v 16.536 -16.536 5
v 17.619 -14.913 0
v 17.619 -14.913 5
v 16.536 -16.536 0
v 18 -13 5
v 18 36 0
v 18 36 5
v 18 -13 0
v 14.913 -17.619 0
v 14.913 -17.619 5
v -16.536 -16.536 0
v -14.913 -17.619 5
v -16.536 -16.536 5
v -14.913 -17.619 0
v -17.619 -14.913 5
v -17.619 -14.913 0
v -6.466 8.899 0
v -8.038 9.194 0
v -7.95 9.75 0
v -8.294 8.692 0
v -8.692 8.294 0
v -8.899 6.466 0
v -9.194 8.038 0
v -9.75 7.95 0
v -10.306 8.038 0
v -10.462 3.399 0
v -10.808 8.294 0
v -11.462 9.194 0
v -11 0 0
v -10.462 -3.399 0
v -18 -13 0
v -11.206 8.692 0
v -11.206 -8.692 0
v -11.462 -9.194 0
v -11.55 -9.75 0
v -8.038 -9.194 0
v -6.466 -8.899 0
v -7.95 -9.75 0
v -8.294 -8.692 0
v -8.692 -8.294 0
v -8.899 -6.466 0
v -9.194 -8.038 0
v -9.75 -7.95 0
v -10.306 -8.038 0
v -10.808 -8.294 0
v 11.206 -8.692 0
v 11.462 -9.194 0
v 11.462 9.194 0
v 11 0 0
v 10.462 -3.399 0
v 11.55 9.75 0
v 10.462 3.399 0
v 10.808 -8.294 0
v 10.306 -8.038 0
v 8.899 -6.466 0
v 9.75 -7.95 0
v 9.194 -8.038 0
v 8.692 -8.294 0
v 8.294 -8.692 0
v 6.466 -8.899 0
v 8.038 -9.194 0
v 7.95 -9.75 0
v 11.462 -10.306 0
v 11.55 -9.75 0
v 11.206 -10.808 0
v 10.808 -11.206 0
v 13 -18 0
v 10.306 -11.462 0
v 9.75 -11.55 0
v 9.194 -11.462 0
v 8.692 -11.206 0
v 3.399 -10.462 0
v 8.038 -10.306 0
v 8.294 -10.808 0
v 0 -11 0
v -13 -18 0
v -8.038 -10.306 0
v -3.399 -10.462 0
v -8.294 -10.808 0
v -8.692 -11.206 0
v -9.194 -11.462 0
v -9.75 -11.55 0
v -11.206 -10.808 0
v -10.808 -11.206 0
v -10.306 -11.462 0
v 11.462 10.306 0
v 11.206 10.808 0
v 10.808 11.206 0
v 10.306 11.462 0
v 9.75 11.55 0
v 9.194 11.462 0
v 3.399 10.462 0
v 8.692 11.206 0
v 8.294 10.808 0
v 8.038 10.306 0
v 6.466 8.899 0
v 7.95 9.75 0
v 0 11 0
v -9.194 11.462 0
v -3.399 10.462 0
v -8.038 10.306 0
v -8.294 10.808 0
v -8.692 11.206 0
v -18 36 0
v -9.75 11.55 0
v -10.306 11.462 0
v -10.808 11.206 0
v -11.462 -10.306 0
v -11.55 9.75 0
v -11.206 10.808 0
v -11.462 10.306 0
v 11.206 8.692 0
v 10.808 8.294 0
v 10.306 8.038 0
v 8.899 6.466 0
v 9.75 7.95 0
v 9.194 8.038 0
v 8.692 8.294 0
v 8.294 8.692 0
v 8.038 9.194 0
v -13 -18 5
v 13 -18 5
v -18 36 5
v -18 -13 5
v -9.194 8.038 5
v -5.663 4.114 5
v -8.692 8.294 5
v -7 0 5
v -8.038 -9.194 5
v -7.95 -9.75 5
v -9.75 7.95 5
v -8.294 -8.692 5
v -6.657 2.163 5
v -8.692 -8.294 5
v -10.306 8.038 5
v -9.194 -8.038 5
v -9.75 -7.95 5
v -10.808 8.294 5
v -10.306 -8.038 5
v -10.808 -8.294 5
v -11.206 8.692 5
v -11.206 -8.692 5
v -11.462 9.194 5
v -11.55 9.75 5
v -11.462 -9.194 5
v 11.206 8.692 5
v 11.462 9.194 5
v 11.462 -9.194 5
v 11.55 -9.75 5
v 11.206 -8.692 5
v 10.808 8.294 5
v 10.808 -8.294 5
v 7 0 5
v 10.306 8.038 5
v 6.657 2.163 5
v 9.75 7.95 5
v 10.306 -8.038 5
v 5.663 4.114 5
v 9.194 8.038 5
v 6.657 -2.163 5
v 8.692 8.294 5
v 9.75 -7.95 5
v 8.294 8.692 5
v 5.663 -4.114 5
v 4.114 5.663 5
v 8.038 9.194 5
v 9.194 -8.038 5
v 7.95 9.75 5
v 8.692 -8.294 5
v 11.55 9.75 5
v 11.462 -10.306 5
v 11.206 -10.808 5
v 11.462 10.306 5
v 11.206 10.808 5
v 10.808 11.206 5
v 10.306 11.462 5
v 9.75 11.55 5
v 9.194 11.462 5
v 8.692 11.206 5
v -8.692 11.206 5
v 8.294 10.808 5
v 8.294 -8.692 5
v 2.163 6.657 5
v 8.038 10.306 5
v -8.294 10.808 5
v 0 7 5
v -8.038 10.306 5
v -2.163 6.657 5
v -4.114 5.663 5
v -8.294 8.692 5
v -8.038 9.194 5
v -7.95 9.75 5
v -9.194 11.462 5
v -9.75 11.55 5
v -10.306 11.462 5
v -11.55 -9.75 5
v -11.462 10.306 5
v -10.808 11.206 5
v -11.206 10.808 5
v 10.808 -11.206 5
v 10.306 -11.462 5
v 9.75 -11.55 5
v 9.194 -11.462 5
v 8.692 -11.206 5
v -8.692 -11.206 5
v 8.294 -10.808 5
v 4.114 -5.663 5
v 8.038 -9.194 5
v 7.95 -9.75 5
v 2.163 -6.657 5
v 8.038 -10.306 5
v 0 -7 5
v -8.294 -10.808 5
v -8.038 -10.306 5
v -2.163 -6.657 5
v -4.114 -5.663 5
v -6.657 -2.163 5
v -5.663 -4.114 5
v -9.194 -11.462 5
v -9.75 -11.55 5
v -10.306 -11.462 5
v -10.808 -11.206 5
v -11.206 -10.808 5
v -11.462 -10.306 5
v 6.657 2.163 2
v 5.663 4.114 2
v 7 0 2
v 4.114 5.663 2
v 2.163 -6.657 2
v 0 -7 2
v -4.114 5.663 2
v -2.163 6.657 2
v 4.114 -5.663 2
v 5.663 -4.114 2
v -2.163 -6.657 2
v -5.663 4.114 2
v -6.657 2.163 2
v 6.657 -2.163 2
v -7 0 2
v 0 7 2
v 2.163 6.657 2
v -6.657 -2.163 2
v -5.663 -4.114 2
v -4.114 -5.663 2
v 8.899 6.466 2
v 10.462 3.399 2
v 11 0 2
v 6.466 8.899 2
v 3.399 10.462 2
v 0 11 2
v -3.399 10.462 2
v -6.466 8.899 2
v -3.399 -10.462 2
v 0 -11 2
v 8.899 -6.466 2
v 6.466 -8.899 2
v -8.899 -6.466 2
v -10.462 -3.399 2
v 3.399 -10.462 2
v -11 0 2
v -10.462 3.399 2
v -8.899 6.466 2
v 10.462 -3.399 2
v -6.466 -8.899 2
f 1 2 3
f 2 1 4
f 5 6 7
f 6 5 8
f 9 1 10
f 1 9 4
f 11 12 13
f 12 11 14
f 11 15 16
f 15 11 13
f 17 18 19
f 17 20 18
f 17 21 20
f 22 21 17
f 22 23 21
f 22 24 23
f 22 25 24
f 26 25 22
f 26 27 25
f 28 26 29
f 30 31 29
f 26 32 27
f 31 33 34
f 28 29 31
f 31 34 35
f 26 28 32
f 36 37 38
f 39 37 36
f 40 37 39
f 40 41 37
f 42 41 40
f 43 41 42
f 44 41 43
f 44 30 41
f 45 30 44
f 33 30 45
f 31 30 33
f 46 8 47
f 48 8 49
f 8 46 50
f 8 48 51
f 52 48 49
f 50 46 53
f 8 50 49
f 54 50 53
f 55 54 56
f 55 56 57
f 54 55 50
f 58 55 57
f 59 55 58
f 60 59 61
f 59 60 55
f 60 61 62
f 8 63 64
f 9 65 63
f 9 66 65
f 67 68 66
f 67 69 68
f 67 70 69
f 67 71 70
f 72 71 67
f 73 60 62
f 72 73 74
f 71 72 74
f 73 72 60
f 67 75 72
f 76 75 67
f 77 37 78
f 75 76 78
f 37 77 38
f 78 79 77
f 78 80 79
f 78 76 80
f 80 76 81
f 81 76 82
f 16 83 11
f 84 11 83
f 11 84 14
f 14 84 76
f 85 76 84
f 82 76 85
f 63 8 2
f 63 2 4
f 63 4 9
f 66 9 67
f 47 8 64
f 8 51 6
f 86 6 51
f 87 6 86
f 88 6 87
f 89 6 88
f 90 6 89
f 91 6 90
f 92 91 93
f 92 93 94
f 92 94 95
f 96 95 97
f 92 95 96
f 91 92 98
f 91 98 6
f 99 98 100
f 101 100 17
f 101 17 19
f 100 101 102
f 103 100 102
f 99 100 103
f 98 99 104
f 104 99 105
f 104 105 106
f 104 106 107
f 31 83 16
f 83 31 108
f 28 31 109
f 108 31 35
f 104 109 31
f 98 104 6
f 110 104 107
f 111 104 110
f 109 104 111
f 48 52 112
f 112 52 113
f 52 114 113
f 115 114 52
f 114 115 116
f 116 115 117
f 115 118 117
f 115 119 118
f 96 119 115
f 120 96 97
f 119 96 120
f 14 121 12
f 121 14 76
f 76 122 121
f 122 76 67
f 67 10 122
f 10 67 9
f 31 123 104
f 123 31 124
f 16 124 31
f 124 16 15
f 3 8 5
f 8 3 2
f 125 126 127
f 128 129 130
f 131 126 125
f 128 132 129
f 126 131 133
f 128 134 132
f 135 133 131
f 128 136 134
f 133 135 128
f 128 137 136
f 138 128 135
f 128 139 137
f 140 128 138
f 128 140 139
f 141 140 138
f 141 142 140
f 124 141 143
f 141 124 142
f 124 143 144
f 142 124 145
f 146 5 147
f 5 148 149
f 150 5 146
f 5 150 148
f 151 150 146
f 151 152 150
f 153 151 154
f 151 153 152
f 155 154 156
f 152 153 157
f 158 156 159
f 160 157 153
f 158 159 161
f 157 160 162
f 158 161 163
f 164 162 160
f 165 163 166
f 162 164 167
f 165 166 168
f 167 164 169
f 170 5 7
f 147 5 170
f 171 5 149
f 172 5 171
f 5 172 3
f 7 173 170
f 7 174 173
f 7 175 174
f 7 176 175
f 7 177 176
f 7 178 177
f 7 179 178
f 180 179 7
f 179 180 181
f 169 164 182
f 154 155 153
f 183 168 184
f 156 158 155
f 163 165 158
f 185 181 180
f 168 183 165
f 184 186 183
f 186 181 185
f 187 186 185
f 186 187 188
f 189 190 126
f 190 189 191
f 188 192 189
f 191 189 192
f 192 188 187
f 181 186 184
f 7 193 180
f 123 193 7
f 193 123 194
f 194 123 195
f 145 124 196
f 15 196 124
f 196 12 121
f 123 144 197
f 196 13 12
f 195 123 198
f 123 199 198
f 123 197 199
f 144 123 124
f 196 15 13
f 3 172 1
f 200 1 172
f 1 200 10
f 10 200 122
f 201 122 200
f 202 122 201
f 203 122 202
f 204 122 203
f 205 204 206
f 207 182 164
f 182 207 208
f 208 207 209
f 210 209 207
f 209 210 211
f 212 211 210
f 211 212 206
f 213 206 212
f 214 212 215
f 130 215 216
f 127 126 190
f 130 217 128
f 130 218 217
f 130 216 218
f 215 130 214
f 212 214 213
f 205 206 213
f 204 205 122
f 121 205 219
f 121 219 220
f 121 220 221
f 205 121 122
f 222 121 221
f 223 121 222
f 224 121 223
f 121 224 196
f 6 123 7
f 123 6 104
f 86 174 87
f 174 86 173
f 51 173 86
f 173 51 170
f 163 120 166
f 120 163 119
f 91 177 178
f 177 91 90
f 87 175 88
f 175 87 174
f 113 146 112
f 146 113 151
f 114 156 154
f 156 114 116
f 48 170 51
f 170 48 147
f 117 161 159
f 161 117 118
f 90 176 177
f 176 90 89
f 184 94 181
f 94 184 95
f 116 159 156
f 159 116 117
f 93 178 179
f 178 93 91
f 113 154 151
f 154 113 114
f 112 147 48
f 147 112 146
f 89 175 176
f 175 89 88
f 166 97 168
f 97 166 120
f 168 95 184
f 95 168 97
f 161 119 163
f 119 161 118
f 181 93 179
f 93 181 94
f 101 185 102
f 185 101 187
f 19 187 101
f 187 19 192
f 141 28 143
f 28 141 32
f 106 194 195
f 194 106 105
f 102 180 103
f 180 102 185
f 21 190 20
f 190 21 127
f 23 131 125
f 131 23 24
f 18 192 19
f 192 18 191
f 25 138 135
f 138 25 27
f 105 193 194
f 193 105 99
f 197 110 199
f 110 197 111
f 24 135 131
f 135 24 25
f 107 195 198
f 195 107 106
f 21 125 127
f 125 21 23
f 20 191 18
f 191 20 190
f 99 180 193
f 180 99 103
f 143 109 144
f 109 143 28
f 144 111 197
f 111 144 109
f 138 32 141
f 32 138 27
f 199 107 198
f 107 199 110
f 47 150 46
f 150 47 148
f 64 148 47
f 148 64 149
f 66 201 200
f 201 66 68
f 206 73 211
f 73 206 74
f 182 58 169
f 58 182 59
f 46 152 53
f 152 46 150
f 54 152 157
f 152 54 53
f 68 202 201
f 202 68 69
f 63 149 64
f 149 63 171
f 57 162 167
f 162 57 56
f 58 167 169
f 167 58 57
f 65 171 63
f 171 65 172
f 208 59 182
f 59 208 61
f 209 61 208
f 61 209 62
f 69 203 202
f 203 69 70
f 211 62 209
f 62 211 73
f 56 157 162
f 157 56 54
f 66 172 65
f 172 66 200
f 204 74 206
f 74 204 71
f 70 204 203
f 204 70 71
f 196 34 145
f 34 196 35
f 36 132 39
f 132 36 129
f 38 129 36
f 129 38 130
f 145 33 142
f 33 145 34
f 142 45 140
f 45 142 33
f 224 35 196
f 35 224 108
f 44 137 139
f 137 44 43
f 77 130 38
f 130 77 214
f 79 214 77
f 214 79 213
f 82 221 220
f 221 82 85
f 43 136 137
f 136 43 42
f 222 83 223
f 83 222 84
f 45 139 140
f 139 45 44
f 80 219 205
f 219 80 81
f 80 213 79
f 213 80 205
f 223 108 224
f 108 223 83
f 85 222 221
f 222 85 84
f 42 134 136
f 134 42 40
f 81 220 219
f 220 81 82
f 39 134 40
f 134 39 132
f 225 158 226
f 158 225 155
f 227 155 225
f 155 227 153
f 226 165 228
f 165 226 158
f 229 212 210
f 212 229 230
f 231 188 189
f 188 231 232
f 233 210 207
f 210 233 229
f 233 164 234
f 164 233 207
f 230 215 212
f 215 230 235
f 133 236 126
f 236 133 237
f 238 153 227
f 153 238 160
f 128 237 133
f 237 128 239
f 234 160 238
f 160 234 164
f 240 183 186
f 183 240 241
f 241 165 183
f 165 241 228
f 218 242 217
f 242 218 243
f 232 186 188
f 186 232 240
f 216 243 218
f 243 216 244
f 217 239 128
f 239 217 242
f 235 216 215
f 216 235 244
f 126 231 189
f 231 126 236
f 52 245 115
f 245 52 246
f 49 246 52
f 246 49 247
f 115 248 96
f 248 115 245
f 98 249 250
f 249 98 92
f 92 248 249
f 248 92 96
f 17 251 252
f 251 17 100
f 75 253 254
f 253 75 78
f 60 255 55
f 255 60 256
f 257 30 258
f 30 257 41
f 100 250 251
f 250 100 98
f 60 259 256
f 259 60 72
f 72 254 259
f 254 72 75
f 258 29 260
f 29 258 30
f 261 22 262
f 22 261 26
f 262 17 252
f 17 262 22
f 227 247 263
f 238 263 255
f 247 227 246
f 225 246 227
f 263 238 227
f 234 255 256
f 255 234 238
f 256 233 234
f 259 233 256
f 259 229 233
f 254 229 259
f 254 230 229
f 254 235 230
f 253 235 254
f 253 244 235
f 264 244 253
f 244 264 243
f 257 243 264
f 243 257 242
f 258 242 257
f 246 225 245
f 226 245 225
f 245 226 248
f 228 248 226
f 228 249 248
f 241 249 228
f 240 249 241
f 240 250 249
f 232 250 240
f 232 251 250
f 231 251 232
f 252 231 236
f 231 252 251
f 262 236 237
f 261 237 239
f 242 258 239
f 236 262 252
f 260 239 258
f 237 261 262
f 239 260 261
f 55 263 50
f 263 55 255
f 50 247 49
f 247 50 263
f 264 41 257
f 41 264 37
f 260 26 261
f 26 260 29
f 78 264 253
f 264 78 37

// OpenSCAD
hole_spacing = 19.5/2;
axle_h = 19.5;
axle_d= 8;
gearbox_groove_d = 22;
gearbox_d = 36;

base_plate_h = 5;
m3_radius = 1.8;
m3_nut_radius = 3.4;
m3_nut_height = 3;

spur_d = 12;
spur_offset = 2;
spur_h=16;
spur_groove_offset = 5; //from top

hole_offset = [
[hole_spacing, hole_spacing, 0],
[-hole_spacing, hole_spacing, 0],
[hole_spacing, -hole_spacing, 0],
[-hole_spacing, -hole_spacing, 0]];

bearing_id=5;
bearing_od=16;
bearing_h=5;

filament_d=1.75;
teeth_g = 0.5;

off = 5;

module base_plate() {
	difference () {
        union () {
            cylinder (d=gearbox_d, h=base_plate_h);
            translate ([-gearbox_d/2,0,0]) cube ([gearbox_d, gearbox_d, base_plate_h]);
        }
        for (a = hole_offset) {
            translate (a)
                cylinder (r=m3_radius, h=base_plate_h, $fn = 20);
        }
    cylinder (d=spur_d+spur_offset, h=base_plate_h, $fn = 20);
    cylinder (d=gearbox_groove_d, h=2, $fn = 20);
	}
    
    //spur gear
    %cylinder (d=spur_d, h=spur_h, $fn = 20);    
    //filament
    %color ("red") translate ([0,-spur_d/2-filament_d/2+teeth_g,spur_h-spur_groove_offset]) rotate ([0,90,0]) cylinder (d=filament_d, h=gearbox_d*1.2, $fn=20, center = true);
    %translate ([0,-spur_d/2-bearing_od/2-filament_d+teeth_g,spur_h-spur_groove_offset-2.5]) bearing_625();
}

module base_plate_2() {
	difference () {
        union () {
            linear_extrude (height = base_plate_h) offset (r=off) square (gearbox_d-2*off, center = true);
            translate ([-gearbox_d/2,0,0]) cube ([gearbox_d, gearbox_d, base_plate_h]);
        }
        for (a = hole_offset) {
            translate (a)
                cylinder (r=m3_radius, h=base_plate_h, $fn = 20);
        }
    cylinder (d=spur_d+spur_offset, h=base_plate_h, $fn = 20);
    cylinder (d=gearbox_groove_d, h=2, $fn = 20);
	}
    
    //spur gear
    %cylinder (d=spur_d, h=spur_h, $fn = 20);    
    //filament
    %color ("red") translate ([0,-spur_d/2-filament_d/2+teeth_g,spur_h-spur_groove_offset]) rotate ([0,90,0]) cylinder (d=filament_d, h=gearbox_d*1.2, $fn=20, center = true);
    %translate ([0,-spur_d/2-bearing_od/2-filament_d+teeth_g,spur_h-spur_groove_offset-2.5]) bearing_625();
}

module arm() {
        %    translate ([0,0,base_plate_h]) 
    intersection () {
        difference () {
            cylinder (d=gearbox_d, h=spur_h-base_plate_h);    
            cylinder (d=bearing_od/2-(-spur_d/2-bearing_od/2-   filament_d+teeth_g), h=spur_h-base_plate_h);    
            translate (hole_offset[3]) cylinder (r=m3_radius,h=spur_h, $fn=32);
        }
            translate ([-gearbox_d/2,-gearbox_d/2,0]) cube ([gearbox_d, gearbox_d/2, spur_h-base_plate_h]);
        
    }
}
base_plate_2();
//arm();


module bearing_625() {
    $fn=32;
    difference() {
        cylinder (d=16, h=5);
        cylinder (d=5, h=5);
    }
}

module frame_mount() {
    
}
